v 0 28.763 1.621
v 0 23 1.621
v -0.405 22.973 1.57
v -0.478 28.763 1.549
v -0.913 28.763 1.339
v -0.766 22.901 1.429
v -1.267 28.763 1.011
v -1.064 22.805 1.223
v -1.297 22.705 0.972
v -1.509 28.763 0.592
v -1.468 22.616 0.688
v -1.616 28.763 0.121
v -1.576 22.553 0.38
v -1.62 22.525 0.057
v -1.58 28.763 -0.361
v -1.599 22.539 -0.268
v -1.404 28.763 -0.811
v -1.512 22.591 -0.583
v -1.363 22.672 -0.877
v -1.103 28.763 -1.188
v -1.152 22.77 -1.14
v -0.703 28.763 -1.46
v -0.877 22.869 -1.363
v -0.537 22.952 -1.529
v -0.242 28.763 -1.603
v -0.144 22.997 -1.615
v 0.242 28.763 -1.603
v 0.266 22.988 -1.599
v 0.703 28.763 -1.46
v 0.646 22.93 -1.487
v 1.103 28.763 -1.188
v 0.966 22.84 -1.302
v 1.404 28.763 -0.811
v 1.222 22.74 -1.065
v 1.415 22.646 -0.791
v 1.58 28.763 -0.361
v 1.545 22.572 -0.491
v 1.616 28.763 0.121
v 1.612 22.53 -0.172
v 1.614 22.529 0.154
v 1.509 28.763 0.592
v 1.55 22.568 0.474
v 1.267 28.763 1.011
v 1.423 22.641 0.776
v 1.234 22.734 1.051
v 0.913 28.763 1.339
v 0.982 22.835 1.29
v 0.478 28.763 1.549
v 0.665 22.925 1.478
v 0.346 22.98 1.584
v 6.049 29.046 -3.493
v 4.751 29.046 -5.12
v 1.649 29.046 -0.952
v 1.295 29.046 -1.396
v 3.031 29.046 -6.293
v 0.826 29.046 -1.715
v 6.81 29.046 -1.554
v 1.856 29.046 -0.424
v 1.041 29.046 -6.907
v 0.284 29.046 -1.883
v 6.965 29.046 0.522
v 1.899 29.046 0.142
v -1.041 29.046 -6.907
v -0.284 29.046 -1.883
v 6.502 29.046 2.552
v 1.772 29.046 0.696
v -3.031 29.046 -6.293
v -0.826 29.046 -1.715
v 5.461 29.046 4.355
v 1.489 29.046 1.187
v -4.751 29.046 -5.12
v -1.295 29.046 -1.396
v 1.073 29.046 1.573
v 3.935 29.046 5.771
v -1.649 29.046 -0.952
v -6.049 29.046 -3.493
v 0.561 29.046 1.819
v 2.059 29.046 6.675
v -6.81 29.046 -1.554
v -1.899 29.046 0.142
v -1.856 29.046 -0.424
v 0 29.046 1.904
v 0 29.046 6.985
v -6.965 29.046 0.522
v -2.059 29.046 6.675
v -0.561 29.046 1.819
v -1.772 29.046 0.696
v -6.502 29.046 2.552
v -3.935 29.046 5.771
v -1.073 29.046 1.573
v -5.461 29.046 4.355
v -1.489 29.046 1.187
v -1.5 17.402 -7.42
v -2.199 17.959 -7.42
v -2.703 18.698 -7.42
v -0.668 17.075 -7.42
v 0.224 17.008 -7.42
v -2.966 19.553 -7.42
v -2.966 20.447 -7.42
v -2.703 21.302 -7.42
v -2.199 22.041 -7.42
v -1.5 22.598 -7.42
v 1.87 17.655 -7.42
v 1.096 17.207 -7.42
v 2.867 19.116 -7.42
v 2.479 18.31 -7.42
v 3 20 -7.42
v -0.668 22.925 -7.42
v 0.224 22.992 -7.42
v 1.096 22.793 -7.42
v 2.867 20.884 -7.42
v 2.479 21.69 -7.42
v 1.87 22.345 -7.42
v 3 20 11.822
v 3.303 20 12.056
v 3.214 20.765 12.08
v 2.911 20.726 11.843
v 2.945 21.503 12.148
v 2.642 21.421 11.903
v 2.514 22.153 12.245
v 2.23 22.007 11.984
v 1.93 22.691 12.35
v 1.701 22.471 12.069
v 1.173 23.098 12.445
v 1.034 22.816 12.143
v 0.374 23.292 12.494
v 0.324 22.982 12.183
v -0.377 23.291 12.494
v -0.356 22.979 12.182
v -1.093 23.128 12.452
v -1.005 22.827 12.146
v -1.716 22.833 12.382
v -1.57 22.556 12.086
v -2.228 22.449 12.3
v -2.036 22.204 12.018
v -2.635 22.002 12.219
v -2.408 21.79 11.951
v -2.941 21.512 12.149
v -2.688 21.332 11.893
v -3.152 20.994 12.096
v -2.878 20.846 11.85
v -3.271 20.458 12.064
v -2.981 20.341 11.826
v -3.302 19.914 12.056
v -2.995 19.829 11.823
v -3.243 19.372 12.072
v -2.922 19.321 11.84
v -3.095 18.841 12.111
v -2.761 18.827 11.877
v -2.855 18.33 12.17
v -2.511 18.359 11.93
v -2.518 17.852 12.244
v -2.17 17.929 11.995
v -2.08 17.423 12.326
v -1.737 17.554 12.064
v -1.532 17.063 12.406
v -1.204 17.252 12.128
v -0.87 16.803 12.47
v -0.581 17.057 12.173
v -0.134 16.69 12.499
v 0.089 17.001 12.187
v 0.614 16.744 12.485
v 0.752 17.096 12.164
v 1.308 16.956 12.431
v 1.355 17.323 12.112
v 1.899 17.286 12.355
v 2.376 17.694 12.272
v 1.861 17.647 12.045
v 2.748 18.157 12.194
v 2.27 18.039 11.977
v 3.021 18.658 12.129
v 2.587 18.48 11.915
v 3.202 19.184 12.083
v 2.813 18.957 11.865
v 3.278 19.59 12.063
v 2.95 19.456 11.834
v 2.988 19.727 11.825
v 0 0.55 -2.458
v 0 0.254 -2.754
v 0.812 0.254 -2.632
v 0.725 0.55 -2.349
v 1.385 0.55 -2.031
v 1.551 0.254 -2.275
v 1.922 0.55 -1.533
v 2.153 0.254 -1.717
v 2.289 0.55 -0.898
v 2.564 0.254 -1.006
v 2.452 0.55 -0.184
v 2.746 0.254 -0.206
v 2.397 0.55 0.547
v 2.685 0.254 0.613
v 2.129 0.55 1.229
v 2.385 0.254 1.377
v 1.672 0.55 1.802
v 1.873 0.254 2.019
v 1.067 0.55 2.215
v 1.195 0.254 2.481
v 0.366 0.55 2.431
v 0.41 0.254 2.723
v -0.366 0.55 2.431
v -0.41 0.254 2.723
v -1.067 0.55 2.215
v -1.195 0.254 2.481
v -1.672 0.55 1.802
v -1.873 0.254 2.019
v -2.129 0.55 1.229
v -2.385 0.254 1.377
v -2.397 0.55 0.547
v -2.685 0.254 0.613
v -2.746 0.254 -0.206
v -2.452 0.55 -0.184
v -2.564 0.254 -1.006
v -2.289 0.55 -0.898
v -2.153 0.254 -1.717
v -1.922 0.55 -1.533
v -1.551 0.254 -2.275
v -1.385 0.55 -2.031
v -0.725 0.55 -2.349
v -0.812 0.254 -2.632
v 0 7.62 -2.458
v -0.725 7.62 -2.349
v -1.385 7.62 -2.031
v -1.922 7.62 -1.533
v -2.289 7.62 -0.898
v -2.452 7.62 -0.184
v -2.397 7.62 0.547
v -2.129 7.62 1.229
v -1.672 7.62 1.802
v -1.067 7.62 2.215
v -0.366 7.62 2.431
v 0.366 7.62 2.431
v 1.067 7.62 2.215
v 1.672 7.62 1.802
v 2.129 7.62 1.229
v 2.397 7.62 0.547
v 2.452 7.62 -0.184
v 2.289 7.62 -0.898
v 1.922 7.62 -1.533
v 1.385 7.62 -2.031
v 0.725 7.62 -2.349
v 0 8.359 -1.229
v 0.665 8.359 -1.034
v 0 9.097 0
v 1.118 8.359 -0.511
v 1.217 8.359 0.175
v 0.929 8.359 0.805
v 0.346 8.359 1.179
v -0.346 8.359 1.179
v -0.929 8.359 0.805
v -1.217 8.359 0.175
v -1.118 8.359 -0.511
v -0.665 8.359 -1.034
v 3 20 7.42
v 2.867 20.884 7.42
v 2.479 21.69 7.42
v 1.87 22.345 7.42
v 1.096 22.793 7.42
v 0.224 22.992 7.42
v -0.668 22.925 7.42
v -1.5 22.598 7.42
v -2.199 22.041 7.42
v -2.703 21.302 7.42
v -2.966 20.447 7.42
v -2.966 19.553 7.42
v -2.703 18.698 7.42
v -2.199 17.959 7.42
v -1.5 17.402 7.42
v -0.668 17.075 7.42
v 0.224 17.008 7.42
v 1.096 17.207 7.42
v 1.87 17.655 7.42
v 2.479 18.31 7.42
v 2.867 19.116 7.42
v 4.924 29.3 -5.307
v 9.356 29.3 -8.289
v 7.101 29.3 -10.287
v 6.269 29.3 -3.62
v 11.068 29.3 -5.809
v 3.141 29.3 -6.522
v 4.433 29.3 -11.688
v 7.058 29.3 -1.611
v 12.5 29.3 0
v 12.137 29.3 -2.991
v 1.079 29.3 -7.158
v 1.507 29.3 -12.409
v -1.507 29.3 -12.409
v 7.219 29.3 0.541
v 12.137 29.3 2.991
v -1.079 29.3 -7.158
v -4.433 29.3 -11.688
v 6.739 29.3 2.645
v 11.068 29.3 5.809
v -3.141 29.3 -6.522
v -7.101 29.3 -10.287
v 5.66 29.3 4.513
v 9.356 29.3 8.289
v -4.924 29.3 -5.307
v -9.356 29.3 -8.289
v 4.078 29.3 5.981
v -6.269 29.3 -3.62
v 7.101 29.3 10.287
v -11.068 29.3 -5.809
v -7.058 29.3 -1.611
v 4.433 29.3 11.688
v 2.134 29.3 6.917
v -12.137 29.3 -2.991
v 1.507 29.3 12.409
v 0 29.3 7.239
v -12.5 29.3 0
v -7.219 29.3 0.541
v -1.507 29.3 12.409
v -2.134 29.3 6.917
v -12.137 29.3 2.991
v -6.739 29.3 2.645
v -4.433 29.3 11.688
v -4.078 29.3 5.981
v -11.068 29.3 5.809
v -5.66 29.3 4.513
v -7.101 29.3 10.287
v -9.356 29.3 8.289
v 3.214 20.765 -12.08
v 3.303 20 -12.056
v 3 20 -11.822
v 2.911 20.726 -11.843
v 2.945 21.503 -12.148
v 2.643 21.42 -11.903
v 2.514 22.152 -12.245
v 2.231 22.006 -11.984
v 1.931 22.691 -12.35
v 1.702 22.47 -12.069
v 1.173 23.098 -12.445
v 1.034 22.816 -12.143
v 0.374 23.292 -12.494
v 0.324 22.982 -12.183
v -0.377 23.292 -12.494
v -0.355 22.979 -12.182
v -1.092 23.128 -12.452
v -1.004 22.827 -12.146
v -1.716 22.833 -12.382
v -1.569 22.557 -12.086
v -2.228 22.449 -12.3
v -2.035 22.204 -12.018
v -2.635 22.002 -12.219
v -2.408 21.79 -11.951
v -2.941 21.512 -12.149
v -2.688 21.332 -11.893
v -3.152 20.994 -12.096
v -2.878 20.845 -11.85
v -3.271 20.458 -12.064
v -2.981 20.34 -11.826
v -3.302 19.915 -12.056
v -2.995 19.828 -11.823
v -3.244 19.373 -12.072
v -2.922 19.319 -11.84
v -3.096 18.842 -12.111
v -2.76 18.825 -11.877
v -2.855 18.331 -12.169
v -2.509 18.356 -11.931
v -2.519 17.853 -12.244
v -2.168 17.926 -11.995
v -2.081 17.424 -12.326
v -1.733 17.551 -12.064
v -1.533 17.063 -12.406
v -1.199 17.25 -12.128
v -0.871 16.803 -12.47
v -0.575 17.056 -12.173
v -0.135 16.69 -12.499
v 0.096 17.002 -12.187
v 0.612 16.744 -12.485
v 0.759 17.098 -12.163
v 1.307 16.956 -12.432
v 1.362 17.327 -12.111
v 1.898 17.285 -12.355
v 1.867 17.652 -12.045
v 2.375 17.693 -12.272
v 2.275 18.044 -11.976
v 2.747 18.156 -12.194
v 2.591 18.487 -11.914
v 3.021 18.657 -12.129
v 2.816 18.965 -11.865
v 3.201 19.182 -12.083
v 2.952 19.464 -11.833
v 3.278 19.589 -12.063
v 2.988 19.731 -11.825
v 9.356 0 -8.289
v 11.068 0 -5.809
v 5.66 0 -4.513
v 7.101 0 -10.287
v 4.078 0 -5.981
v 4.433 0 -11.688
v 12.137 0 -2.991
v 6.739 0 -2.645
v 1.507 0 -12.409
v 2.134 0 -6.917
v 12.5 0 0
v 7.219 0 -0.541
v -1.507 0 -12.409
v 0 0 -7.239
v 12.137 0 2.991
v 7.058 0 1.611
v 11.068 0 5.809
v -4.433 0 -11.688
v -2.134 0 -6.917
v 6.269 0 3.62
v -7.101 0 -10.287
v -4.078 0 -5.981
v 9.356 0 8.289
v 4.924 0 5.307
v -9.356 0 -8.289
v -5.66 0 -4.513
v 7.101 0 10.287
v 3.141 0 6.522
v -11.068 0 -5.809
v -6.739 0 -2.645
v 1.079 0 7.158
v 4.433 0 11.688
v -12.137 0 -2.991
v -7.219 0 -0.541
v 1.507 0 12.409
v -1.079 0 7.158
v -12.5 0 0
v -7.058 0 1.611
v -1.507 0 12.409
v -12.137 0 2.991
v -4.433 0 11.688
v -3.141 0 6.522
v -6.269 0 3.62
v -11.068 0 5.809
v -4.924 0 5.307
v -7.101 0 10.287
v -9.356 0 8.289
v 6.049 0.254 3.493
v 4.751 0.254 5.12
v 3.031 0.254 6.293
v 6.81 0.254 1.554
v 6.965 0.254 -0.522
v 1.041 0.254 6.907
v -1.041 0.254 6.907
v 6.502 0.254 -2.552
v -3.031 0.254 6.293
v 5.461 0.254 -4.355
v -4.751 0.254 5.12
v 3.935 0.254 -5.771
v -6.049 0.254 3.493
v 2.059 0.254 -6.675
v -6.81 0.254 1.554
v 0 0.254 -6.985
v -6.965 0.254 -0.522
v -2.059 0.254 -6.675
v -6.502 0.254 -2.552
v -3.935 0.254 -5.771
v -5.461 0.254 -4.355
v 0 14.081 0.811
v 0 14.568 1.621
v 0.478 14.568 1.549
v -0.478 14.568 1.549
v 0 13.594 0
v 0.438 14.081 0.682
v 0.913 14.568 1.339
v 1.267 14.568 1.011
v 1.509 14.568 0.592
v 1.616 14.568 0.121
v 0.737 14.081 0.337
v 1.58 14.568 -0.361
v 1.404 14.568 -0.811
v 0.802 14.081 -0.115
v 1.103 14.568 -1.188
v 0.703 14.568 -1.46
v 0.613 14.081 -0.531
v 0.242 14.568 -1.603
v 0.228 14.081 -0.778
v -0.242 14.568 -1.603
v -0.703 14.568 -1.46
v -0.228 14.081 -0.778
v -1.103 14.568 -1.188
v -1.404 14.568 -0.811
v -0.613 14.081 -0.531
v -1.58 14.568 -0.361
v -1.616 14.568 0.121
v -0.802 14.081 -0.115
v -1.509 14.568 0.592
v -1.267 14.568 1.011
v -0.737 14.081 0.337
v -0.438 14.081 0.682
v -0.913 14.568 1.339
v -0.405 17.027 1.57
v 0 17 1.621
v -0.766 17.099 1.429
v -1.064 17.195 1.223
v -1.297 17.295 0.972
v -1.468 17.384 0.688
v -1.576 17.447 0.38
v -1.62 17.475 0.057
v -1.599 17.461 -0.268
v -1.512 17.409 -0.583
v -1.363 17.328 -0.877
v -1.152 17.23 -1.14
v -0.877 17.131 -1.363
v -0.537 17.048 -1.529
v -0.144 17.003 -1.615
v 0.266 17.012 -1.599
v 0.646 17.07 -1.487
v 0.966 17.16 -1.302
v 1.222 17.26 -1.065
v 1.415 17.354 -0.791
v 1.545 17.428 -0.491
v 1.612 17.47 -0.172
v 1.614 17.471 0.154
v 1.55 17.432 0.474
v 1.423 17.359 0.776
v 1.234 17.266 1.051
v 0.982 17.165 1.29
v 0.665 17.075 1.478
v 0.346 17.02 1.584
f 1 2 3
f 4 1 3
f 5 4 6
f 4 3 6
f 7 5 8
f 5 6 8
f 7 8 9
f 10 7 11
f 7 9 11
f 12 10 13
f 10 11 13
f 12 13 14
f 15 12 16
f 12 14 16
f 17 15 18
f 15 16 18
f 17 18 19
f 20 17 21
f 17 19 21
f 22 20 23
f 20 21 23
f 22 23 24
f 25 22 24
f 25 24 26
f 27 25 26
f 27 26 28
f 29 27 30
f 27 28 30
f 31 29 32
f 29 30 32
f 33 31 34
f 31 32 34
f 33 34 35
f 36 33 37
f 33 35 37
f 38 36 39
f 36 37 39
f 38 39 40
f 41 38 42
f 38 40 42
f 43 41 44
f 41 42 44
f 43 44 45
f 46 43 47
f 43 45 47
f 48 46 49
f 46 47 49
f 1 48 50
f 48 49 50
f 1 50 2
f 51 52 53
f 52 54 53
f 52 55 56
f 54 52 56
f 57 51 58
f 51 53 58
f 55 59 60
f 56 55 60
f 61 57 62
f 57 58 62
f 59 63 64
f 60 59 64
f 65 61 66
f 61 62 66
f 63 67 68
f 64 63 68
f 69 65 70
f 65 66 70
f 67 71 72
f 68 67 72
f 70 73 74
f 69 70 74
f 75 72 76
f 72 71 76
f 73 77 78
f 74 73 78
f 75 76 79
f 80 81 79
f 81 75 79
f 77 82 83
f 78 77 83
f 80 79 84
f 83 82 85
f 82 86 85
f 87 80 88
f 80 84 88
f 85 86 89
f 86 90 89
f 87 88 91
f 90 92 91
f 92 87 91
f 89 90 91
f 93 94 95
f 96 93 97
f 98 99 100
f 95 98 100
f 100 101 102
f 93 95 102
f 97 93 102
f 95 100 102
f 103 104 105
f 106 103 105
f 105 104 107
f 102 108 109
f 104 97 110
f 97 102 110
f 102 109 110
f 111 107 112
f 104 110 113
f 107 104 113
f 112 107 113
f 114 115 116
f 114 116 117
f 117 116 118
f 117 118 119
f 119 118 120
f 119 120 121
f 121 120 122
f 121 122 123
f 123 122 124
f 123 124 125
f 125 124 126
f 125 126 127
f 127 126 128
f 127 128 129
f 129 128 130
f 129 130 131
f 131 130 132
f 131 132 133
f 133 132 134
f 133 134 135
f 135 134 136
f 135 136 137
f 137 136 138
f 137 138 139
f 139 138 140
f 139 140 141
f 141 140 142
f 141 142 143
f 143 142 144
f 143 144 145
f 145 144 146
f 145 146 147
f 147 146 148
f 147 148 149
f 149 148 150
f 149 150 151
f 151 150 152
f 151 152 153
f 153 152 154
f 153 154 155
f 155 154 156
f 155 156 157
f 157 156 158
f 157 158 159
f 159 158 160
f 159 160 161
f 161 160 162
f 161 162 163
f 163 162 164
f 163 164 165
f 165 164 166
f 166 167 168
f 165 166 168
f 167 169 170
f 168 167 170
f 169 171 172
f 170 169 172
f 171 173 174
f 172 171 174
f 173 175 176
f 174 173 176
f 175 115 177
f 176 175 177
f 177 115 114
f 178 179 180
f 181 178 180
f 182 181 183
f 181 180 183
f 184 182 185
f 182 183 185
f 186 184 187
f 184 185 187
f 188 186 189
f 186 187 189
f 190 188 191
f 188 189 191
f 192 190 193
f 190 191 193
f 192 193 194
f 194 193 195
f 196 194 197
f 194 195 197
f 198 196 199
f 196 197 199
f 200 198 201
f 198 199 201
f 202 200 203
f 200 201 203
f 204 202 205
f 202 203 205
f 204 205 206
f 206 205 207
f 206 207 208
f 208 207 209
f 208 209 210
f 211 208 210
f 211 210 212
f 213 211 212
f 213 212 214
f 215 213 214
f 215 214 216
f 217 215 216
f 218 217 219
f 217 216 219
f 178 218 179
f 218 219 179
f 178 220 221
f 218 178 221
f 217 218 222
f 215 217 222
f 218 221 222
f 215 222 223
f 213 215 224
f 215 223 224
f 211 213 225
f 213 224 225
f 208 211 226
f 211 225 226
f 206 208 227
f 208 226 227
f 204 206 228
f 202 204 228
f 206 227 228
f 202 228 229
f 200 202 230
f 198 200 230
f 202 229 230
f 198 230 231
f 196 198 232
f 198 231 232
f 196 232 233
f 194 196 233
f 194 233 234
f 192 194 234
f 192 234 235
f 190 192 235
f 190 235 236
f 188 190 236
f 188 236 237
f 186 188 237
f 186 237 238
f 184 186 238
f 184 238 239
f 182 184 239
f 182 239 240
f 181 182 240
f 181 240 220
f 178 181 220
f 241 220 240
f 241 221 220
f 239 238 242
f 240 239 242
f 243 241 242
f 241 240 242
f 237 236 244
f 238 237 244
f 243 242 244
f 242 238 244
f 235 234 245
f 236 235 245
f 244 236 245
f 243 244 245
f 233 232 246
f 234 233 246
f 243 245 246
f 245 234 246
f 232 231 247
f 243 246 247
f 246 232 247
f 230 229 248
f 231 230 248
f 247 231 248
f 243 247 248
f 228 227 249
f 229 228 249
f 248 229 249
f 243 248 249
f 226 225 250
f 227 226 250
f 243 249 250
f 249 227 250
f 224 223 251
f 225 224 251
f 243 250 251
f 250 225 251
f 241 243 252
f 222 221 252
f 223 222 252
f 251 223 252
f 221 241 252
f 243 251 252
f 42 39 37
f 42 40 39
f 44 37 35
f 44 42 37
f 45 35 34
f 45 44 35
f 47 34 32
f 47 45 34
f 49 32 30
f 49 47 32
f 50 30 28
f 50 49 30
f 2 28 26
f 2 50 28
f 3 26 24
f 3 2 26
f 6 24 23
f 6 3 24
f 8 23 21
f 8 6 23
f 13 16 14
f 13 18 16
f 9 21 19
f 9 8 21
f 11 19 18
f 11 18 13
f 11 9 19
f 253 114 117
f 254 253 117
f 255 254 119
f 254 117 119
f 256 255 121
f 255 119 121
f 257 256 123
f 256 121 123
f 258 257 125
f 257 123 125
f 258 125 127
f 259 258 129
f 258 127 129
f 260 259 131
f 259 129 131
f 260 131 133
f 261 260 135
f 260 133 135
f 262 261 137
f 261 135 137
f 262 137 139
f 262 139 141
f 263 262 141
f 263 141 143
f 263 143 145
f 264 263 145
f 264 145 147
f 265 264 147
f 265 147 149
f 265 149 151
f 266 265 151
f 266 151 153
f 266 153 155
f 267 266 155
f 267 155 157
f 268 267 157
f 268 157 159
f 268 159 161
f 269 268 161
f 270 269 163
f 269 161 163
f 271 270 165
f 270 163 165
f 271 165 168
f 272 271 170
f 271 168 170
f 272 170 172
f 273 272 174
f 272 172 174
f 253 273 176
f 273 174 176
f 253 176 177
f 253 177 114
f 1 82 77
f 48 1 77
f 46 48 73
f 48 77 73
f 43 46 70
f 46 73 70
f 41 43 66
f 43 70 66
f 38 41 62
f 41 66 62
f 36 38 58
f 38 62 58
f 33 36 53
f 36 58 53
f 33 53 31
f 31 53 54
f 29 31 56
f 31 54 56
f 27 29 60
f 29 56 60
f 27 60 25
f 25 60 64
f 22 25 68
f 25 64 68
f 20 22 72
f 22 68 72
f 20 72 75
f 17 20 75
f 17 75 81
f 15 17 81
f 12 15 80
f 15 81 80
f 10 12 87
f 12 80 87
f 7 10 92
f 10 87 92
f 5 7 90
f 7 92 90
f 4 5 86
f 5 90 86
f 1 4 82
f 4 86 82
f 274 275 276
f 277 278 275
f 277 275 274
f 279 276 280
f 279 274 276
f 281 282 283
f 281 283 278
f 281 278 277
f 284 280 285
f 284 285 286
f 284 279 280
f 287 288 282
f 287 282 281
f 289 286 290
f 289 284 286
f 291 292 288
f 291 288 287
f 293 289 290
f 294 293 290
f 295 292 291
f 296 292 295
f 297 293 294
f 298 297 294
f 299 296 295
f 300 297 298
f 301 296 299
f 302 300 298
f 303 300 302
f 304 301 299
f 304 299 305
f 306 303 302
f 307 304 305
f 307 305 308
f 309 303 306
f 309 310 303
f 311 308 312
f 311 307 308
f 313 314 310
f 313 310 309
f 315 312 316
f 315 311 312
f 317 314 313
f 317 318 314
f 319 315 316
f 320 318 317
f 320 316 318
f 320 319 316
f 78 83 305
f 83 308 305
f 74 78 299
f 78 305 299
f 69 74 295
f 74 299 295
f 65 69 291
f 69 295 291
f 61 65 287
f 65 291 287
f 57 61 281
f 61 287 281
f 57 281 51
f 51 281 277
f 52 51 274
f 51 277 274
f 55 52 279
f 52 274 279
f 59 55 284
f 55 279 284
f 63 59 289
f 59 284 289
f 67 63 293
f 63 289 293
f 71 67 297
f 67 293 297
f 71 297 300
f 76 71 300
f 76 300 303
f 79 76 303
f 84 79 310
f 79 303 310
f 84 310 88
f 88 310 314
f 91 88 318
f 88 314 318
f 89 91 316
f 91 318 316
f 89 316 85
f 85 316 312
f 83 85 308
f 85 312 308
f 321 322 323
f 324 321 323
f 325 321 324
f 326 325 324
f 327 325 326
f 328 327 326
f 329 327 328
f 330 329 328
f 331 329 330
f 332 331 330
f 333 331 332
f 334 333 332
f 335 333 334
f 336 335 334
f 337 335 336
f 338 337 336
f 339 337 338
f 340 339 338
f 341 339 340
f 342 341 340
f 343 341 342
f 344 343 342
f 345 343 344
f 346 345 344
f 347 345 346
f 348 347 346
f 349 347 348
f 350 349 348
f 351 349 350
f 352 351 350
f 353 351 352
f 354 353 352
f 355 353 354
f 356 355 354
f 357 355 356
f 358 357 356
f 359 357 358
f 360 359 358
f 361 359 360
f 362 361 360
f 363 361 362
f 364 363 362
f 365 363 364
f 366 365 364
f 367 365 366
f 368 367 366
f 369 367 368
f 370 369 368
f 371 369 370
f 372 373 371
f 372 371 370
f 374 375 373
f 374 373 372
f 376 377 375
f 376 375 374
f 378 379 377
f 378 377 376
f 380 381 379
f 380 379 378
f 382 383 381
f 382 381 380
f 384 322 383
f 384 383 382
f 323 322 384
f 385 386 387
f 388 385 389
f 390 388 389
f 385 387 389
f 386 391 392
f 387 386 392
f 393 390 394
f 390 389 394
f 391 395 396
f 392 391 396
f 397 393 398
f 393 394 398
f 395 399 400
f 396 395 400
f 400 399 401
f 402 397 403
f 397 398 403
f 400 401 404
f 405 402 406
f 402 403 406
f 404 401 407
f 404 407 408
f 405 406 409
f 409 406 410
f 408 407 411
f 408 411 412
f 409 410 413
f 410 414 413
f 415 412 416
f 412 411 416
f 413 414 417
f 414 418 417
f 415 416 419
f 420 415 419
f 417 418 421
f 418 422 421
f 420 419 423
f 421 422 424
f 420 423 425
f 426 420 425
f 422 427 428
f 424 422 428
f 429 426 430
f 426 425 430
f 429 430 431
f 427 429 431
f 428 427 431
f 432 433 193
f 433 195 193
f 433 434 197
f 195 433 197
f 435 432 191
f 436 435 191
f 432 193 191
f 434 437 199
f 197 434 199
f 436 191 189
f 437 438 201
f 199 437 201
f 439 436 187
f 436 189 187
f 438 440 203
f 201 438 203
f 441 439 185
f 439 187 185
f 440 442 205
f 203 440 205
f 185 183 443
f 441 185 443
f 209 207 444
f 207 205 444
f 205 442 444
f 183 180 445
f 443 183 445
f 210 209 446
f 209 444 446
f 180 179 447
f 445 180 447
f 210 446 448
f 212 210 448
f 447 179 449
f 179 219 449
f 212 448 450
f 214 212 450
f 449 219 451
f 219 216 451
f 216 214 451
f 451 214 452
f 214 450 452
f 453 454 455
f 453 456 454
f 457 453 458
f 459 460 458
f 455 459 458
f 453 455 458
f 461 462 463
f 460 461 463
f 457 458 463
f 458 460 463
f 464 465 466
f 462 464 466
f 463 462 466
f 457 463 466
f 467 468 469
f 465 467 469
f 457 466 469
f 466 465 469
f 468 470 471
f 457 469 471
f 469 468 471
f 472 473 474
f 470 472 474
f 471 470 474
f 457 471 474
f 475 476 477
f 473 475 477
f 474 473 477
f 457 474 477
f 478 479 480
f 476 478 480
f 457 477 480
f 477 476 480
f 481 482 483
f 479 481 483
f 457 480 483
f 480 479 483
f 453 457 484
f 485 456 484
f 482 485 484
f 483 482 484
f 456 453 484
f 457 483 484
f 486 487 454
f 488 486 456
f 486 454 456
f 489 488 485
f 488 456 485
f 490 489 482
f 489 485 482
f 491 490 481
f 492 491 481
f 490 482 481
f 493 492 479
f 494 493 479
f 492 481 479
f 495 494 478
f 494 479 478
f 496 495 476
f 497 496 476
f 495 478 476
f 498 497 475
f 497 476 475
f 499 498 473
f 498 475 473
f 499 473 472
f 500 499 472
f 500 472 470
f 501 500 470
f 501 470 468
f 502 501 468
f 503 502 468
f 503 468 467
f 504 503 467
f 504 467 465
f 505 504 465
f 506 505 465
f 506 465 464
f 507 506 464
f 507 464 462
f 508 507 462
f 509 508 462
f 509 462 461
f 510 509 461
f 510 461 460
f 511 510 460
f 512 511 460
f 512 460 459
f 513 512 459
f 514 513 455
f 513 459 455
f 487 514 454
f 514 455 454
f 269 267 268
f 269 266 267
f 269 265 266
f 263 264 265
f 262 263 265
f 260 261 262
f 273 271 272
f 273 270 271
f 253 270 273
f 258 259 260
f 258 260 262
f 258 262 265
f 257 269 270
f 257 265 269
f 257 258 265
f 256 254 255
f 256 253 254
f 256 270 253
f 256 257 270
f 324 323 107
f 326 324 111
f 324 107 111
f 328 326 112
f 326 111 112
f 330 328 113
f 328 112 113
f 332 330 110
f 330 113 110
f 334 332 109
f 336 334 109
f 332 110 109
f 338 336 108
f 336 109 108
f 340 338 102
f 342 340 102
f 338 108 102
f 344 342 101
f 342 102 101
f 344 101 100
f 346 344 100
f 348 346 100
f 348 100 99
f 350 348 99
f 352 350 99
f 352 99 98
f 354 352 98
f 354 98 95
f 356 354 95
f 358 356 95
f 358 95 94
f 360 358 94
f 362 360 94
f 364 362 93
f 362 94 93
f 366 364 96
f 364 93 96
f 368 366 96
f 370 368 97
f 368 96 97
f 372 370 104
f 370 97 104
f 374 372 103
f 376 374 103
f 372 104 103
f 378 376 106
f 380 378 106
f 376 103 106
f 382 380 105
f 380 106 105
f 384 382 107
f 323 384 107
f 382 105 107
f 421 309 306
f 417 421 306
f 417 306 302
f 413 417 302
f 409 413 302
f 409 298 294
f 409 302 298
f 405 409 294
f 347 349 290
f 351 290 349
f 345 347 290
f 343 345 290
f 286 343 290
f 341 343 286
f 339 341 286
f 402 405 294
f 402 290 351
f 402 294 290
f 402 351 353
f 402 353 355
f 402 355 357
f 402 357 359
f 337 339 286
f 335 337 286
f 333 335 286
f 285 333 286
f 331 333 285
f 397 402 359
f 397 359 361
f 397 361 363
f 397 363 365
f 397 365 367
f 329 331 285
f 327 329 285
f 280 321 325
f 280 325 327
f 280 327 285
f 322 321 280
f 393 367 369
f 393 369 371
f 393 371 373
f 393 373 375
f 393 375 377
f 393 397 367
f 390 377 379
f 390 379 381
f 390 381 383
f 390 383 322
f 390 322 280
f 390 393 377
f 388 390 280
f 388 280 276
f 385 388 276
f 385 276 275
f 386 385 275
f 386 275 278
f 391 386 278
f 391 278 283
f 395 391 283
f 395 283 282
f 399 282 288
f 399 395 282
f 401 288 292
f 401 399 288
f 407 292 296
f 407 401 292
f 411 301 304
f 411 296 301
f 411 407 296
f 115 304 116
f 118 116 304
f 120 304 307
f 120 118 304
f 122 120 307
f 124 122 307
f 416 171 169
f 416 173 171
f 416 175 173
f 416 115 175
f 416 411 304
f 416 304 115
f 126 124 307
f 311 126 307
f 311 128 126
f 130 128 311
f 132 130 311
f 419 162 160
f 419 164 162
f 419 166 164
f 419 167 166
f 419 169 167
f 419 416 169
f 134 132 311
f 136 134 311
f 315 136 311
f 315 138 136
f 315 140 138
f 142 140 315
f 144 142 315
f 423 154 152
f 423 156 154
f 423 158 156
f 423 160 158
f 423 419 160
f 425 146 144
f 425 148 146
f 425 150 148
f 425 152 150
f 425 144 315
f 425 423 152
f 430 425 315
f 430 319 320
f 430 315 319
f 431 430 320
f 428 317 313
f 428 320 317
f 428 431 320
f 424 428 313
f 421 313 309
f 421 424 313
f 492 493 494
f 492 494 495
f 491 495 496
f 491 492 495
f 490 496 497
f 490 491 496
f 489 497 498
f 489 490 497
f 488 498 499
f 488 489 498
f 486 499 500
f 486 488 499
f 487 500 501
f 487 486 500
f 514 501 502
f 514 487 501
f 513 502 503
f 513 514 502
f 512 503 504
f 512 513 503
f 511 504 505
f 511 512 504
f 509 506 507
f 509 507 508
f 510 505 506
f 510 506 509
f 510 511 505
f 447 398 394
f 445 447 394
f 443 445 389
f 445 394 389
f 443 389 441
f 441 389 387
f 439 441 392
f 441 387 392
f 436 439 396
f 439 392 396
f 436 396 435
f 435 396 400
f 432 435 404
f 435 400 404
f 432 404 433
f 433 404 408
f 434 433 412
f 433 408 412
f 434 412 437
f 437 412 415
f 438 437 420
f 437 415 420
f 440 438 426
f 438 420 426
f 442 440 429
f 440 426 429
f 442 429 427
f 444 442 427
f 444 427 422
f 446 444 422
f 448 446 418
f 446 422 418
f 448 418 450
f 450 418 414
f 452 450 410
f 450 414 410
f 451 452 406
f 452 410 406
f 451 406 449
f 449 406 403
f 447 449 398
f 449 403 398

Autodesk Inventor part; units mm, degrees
ref_plane "YZ Plane" through (0, 0, 0) normal (1, 0, 0) x (0, 1, 0)
ref_plane "XZ Plane" through (0, 0, 0) normal (0, 1, 0) x (-1, 0, 0)
ref_plane "XY Plane" through (0, 0, 0) normal (0, 0, 1) x (1, 0, 0)
sketch "Sketch1" plane through (0, 0, 0) normal (0, 1, 0) x (-1, 0, 0)
  circle A0 centre (0, 0) radius 12.5
  dimension "d0" = 25
extrude "Extrusion1" add sketch "Sketch1" along normal blind 29.3
hole "ReliefTop" at (0, 29.3, 0) direction (0, -1, 0) diameter 13.97 depth 0.254 countersink diameter 14.478 countersink angle 90
hole "ReliefBottom" at (0, 0, 0) direction (0, 1, 0) diameter 13.97 depth 0.254 countersink diameter 14.478 countersink angle 90
hole "MountBottomM6" at (0, 0.254, 0) direction (0, 1, 0) diameter 4.917 depth 7.366 tip angle 118 countersink diameter 5.508 countersink angle 90 thread size "M6x1" class "6H" standard "ISO Metric profile"
hole "MountTopM4" at (0, 29.046, 0) direction (0, -1, 0) diameter 3.242 depth 14.478 tip angle 118 countersink diameter 3.808 countersink angle 90 thread size "M4x0.7" class "6H" standard "ISO Metric profile"
sketch "Sketch2" plane through (0, 0, 0) normal (0, 0, 1) x (1, 0, 0)
  circle A0 centre (0, 20) radius 3
  line L0 (-12.5, 0) -> (12.5, 0) projected
  line L1 (0, -4.6) -> (0, 27.6) projected
  point P0 (0, 0)
  dimension "d49" = 6
  dimension "d50" = 20
extrude "Extrusion2" cut sketch "Sketch2" along normal through all both and the other way through all
chamfer "Chamfer1" distance 0.313 angle 45 2 edges at (-3, 19.9998, 12.1347) (-3, 19.9998, -12.1347)
extrude "Extrusion3" add sketch "Sketch2" along normal mid plane 14.84
equation "\"d1\" = height"
equation "\"d5\" = reliefMinor"
equation "\"d7\" = reliefMajor"
equation "\"d10\" = reliefDepth"
equation "\"d14\" = reliefMinor"
equation "\"d16\" = reliefMajor"
equation "\"d19\" = reliefDepth"
equation "\"d25\" = chamferM6"
equation "\"d28\" = depthM6"
equation "\"d40\" = chamferM4"
equation "\"d43\" = depthM4"
equation "\"reliefDepth\" = 0.254"
equation "\"reliefMinor\" = 13.97"
equation "\"reliefMajor\" = 14.478"
equation "\"chamferM6\" = 5.508"
equation "\"chamferM4\" = 3.808"
equation "\"depthM6\" = 7.366"
equation "\"depthM4\" = 14.478"
equation "\"height\" = 29.3"
properties part number "PLS-P642H0293A00_M" material "Stainless Steel"
